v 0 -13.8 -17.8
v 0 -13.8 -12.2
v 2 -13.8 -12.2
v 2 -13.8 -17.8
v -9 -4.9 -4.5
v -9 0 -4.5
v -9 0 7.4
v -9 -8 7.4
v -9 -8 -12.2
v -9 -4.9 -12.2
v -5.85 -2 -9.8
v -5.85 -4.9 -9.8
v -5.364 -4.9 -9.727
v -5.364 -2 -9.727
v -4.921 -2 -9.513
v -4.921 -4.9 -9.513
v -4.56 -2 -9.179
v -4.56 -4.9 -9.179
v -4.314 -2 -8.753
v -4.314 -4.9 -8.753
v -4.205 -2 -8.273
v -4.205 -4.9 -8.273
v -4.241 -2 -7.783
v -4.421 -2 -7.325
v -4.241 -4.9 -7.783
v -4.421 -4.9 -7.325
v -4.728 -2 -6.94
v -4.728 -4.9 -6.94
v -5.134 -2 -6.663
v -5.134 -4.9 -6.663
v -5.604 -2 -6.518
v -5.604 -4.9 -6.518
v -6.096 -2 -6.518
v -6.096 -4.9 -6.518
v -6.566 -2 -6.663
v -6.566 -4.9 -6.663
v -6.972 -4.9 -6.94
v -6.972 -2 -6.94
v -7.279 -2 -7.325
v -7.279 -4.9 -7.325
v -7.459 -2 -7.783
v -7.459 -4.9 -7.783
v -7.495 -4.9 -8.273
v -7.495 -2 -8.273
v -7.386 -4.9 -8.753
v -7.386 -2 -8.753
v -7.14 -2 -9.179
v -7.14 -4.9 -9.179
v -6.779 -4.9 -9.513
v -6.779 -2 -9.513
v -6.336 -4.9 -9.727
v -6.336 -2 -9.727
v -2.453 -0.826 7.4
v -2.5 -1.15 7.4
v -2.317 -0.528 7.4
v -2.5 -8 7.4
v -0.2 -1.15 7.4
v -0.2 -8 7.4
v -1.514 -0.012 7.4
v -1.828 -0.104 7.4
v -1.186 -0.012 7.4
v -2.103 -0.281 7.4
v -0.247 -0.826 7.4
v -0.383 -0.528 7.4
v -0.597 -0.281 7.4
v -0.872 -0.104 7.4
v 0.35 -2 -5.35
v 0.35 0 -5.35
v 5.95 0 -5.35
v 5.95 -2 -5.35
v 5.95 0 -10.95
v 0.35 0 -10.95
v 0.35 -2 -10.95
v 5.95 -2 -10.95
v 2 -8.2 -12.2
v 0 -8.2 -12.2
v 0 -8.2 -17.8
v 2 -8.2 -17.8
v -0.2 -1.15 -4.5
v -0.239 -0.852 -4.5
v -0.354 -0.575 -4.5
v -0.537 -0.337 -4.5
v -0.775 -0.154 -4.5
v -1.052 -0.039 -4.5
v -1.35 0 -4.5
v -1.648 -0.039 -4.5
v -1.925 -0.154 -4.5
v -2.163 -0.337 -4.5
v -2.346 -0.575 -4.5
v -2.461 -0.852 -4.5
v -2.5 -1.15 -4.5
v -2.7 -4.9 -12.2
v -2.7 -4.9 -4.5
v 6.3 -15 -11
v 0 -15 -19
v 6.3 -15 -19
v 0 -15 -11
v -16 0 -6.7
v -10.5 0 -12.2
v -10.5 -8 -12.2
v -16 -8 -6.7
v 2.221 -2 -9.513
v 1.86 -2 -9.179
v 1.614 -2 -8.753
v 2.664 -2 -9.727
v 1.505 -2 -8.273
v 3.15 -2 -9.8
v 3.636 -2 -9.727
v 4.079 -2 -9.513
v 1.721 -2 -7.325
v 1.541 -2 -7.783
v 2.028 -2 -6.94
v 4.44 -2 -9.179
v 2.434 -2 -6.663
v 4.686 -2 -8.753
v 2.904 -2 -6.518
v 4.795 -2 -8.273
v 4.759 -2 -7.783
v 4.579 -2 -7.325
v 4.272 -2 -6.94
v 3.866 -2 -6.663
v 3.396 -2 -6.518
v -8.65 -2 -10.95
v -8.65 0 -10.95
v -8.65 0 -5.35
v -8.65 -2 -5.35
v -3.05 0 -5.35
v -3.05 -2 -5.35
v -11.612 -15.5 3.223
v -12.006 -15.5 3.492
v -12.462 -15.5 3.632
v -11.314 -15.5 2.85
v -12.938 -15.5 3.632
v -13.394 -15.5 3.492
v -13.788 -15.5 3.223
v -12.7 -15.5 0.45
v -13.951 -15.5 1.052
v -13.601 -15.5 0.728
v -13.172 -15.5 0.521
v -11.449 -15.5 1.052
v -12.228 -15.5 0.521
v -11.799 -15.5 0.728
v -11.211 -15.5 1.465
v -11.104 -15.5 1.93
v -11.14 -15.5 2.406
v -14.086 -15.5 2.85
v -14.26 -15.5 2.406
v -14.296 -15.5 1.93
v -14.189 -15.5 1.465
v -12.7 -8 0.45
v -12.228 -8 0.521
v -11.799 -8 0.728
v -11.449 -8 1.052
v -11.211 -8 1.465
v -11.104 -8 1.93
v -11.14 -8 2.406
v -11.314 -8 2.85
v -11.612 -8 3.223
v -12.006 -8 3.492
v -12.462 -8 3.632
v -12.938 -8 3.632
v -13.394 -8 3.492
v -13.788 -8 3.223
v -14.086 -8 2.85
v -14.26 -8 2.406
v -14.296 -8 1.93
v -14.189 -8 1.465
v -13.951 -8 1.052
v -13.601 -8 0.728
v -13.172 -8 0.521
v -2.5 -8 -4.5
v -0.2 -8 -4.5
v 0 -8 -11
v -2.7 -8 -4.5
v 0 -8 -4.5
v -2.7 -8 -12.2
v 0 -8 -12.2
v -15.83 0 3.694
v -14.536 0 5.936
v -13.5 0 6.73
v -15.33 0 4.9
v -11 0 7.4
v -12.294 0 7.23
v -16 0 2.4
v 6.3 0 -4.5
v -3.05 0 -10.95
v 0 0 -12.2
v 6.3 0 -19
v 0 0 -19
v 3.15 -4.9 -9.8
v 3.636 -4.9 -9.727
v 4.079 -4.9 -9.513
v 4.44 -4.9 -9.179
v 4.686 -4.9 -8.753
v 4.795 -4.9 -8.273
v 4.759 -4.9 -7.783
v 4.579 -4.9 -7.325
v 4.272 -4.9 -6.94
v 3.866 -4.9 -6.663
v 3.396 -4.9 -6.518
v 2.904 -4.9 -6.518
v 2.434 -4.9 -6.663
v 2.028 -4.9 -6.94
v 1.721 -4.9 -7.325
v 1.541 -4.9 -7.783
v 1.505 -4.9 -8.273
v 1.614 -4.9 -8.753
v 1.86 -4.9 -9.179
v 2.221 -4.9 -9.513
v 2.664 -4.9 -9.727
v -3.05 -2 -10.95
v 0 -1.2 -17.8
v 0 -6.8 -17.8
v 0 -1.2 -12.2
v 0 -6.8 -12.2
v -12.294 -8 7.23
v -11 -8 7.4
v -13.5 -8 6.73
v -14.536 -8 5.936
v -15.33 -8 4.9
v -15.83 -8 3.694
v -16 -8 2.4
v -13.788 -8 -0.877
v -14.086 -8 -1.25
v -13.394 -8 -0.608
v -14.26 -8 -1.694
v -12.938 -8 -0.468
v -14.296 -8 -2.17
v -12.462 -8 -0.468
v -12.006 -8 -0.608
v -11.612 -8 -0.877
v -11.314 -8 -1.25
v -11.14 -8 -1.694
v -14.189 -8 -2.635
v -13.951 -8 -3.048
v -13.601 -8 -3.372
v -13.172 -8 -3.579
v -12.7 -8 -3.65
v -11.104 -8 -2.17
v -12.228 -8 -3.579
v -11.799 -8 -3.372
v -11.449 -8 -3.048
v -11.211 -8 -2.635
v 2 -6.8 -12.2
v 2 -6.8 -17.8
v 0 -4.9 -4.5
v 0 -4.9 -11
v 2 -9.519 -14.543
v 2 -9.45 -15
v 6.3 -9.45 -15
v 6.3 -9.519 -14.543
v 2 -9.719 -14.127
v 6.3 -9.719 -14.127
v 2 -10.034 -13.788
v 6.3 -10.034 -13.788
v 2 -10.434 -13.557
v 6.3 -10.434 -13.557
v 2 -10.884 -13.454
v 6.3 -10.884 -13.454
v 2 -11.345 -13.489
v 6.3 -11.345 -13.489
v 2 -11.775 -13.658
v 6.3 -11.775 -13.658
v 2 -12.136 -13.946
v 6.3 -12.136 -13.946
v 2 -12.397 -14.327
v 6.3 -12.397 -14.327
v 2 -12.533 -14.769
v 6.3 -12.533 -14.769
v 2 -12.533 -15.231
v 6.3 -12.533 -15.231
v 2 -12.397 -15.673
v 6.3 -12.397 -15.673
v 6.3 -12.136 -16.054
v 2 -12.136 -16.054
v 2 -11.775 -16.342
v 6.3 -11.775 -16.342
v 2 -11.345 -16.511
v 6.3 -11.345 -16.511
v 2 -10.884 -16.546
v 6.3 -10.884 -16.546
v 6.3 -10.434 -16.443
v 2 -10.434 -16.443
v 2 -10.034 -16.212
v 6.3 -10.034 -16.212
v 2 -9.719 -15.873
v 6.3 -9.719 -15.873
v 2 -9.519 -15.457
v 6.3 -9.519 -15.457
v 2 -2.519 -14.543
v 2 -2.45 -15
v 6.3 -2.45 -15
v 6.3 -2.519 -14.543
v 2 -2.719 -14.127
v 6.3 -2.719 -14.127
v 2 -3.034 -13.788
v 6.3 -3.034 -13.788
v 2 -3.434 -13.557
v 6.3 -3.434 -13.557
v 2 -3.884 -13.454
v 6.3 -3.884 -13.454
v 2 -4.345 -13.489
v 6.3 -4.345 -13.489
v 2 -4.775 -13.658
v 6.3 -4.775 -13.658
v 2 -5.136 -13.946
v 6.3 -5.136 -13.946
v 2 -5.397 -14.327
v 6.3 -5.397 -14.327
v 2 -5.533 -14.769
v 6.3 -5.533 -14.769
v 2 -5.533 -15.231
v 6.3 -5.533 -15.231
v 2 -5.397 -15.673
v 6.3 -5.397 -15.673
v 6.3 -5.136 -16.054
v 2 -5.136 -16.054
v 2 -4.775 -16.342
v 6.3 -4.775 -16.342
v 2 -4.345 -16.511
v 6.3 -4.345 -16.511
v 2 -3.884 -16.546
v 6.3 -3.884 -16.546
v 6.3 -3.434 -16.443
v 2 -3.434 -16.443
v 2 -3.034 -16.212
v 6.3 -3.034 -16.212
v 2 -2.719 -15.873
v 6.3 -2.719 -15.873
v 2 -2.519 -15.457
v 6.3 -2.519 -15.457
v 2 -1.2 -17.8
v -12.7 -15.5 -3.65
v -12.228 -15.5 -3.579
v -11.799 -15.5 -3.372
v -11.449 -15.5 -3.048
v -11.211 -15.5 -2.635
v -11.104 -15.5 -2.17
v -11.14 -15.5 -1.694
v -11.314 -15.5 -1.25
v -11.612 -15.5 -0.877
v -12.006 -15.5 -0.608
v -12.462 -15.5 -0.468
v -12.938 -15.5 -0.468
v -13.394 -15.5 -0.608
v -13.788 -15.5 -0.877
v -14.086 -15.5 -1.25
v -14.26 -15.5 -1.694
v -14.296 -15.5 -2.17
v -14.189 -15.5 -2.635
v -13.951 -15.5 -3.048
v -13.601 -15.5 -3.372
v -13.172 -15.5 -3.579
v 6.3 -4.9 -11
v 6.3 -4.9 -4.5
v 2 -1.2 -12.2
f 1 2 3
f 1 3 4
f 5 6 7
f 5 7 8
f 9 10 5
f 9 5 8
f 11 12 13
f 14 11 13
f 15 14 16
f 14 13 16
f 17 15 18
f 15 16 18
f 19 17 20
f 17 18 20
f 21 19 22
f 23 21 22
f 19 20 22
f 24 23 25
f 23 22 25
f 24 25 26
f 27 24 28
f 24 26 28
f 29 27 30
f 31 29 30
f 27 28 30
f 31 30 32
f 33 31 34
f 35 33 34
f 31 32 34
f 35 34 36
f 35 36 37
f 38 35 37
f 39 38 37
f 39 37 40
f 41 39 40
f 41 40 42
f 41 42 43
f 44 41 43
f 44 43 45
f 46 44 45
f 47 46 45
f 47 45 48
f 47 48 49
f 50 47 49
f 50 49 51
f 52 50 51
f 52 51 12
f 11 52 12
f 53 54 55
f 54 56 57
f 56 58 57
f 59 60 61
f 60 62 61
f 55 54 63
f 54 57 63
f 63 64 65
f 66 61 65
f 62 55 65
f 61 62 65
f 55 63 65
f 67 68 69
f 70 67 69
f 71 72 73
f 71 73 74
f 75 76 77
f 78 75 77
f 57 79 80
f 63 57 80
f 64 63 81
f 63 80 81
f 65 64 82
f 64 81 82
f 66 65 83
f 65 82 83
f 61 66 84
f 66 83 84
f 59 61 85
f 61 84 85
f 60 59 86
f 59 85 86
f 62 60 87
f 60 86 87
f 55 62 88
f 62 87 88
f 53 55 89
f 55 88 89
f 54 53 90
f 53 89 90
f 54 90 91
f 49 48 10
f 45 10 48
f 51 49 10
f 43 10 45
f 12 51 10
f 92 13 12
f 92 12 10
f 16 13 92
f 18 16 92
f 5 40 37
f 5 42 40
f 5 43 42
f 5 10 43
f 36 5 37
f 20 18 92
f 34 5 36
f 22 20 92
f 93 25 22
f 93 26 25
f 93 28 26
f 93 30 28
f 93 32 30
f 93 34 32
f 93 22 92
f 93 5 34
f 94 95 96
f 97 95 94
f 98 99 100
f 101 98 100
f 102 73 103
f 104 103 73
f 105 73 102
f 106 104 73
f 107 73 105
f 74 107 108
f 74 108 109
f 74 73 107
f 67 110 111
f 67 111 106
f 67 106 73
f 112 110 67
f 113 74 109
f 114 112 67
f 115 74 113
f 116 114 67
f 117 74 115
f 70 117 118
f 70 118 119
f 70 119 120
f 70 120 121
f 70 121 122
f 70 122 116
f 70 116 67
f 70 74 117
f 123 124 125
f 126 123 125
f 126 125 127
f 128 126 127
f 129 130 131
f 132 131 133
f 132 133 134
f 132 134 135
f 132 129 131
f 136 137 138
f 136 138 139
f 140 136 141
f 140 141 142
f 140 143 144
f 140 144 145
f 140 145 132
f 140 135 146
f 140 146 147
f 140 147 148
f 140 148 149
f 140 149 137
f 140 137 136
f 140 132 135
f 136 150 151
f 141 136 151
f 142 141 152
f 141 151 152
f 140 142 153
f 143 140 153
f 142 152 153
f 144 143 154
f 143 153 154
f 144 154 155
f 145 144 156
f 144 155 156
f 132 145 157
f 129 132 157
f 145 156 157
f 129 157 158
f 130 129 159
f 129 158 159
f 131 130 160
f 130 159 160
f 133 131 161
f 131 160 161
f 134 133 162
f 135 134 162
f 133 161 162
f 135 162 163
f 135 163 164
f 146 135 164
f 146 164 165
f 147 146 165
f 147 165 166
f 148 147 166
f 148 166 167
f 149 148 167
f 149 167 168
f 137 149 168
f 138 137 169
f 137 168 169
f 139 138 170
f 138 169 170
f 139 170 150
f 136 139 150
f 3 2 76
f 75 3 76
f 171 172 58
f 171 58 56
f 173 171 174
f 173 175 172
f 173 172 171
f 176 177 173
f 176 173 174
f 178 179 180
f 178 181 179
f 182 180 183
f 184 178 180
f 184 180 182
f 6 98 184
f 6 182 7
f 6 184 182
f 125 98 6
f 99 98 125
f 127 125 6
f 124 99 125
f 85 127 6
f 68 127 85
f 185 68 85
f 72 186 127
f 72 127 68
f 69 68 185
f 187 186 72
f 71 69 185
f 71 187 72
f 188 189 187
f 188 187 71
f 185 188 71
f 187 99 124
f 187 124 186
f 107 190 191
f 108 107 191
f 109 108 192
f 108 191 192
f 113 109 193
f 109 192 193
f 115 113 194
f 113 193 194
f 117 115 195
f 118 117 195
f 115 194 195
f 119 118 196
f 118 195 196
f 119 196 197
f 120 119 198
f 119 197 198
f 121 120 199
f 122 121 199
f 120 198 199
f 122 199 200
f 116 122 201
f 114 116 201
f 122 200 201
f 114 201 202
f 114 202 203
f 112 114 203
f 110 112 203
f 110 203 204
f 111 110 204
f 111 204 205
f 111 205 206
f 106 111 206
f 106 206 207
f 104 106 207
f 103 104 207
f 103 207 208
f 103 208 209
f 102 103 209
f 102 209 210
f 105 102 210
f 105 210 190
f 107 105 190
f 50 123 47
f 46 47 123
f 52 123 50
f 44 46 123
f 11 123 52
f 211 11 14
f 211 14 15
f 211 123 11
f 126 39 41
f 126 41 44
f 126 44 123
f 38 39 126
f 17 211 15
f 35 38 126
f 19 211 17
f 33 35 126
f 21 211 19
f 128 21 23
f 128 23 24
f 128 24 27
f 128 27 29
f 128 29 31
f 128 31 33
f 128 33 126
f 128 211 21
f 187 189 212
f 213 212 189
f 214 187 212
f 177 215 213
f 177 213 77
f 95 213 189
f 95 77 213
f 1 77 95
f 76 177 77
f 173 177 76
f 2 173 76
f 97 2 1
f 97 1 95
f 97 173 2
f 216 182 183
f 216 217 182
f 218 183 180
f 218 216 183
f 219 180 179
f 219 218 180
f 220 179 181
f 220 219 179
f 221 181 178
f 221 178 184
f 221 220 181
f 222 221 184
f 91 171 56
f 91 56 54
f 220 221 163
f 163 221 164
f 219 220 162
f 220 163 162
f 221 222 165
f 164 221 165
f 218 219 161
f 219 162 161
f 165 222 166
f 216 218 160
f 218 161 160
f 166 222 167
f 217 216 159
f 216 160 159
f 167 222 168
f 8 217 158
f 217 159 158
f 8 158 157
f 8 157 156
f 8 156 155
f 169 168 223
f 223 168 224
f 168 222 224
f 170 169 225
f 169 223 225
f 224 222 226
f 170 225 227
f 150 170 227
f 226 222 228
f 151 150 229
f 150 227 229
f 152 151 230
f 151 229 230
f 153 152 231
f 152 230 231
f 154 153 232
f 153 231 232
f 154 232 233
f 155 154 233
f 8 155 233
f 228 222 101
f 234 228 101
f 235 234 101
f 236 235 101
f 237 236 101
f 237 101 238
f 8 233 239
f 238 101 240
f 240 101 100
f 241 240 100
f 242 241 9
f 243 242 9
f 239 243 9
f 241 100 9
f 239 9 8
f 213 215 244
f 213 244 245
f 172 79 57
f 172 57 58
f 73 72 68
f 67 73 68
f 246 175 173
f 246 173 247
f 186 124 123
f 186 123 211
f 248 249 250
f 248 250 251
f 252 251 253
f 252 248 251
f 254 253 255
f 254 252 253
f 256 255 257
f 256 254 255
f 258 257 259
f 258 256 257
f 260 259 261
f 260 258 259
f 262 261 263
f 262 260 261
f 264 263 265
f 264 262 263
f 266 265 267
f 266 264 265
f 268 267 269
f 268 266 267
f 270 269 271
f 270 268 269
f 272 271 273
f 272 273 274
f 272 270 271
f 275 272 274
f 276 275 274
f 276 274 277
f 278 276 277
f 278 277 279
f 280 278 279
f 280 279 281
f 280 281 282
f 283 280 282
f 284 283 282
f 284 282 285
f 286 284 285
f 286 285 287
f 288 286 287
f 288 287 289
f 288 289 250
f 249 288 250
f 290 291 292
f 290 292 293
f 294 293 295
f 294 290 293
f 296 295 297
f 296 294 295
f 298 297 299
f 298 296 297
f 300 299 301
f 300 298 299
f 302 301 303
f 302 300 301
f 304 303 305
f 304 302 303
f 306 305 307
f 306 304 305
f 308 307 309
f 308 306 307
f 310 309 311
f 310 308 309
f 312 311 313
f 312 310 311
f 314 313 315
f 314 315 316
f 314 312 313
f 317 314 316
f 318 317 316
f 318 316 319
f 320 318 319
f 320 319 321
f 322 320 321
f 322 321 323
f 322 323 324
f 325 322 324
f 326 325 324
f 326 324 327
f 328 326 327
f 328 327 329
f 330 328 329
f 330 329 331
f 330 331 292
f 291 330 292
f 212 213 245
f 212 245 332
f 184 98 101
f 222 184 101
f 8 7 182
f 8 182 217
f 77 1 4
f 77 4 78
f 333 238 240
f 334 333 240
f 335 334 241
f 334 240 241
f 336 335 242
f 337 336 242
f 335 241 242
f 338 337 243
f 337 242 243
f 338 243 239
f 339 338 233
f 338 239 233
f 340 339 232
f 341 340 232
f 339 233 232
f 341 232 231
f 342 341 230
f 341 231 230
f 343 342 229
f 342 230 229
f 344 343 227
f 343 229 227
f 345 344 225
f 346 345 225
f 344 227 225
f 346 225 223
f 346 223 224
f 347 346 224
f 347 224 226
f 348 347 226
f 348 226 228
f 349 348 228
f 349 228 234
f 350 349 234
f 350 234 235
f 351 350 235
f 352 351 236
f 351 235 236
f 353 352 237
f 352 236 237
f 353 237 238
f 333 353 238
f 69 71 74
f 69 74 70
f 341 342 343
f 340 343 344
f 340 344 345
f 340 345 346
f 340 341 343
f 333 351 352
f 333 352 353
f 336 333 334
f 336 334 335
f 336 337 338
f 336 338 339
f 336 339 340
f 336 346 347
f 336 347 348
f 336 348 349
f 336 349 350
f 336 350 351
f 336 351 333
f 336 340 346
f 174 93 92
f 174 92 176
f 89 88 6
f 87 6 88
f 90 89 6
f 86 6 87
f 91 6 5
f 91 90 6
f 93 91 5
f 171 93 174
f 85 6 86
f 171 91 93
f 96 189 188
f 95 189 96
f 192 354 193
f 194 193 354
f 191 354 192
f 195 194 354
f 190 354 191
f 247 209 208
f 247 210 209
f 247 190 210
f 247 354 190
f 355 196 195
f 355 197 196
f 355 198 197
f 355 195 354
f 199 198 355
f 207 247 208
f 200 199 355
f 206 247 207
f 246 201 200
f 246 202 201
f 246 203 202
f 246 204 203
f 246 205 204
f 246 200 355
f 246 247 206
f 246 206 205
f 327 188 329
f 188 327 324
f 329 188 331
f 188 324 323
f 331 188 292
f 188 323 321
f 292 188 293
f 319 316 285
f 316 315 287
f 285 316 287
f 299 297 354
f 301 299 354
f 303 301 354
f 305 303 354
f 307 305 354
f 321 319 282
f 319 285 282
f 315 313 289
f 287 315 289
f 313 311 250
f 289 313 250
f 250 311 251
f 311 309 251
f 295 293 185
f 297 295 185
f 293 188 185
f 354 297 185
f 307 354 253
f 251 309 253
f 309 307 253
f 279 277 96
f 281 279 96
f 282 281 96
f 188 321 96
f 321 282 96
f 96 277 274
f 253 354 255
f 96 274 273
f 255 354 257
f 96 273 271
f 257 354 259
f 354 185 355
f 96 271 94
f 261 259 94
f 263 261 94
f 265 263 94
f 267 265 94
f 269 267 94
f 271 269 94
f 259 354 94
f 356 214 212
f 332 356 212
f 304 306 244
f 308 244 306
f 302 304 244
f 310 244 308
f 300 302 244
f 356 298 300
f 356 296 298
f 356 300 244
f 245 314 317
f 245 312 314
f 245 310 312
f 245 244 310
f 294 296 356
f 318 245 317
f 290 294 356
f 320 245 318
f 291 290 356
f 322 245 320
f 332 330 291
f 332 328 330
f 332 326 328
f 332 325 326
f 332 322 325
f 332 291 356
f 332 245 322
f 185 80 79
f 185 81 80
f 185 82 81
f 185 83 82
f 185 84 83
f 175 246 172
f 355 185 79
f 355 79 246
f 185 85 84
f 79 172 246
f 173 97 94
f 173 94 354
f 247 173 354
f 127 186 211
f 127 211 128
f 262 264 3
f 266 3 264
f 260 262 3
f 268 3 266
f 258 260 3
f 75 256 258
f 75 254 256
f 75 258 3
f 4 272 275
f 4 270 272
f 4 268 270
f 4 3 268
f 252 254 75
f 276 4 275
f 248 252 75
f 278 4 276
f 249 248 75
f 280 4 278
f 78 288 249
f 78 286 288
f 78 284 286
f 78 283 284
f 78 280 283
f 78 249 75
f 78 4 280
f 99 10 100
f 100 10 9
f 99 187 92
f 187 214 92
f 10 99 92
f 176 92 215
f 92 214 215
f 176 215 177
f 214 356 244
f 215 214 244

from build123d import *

# Parameters (mm, degrees)
SKETCH_R        = 1.55
PAD_DEPTH       = 6.3
SKETCH002_W     = 5.6
SKETCH002_H     = 5.6
POCKET_DEPTH    = 2
PAD001_DEPTH    = 7.7
SKETCH003_R     = 1.65
POCKET001_DEPTH = 4.901
SKETCH004_W     = 5.6
SKETCH004_H     = 5.6
POCKET002_DEPTH = 2
SKETCH005_W     = 8
SKETCH005_H     = 7
PAD002_DEPTH    = 11.9
SKETCH006_R     = 1.6
PAD003_DEPTH    = 7.5
PAD004_DEPTH    = 11.9
FILLET_R        = 5
CHAMFER_SIZE    = 5.5


with BuildPart() as part:
    # Sketch → Pad (new body)
    with BuildSketch(Plane.YZ):
        Polygon((-4.9, -4.5), (0, -4.5), (0, -19), (-15, -19), (-15, -11), (-4.9, -11), align=None)
        with Locations((-11, -15)):
            Circle(SKETCH_R, mode=Mode.SUBTRACT)
        with Locations((-4, -15)):
            Circle(SKETCH_R, mode=Mode.SUBTRACT)
    extrude(amount=PAD_DEPTH)

    # Sketch002 (on Face9 of Pad) → Pocket (cut)
    with BuildSketch(Plane(origin=(0, 0, 0), x_dir=(0, 1, 0), z_dir=(-1, 0, 0))):
        with Locations((-11, 15)):
            Rectangle(SKETCH002_W, SKETCH002_H)
        with Locations((-4, 15)):
            Rectangle(SKETCH002_W, SKETCH002_H)
    extrude(amount=-POCKET_DEPTH, mode=Mode.SUBTRACT)

    # Sketch001 (on Face1 of Pad) → Pad001 (join)
    with BuildSketch(Plane(origin=(0, 0, -4.5), x_dir=(0, -1, 0), z_dir=(0, 0, 1))):
        Polygon((0, 0), (0, -16), (8, -16), (8, -9), (4.9, -9), (4.9, -2.7), (8, -2.7), (8, 0), align=None)
    extrude(amount=-PAD001_DEPTH)

    # Sketch003 (on Face1 of Pad001) → Pocket001 (cut, through all)
    with BuildSketch(Plane(origin=(0, -4.9, 0), x_dir=(0, 0, -1), z_dir=(0, -1, 0))):
        with Locations((8.15, -5.85)):
            Circle(SKETCH003_R)
        with Locations((8.15, 3.15)):
            Circle(SKETCH003_R)
    extrude(amount=-POCKET001_DEPTH, mode=Mode.SUBTRACT)

    # Sketch004 (on Face10 of Pocket001) → Pocket002 (cut)
    with BuildSketch(Plane.ZX):
        with Locations((-8.15, 3.15)):
            Rectangle(SKETCH004_W, SKETCH004_H)
        with Locations((-8.15, -5.85)):
            Rectangle(SKETCH004_W, SKETCH004_H)
    extrude(amount=-POCKET002_DEPTH, mode=Mode.SUBTRACT)

    # Sketch005 (on Face5 of Pocket002) → Pad002 (join)
    with BuildSketch(Plane(origin=(0, 0, -4.5), x_dir=(0, -1, 0), z_dir=(0, 0, 1))):
        with Locations((4, -12.5)):
            Rectangle(SKETCH005_W, SKETCH005_H)
    extrude(amount=PAD002_DEPTH)

    # Sketch006 (on Face36 of Pad002) → Pad003 (join)
    with BuildSketch(Plane(origin=(0, -8, 0), x_dir=(0, 0, -1), z_dir=(0, -1, 0))):
        with Locations((-2.05, -12.7)):
            Circle(SKETCH006_R)
        with Locations((2.05, -12.7)):
            Circle(SKETCH006_R)
    extrude(amount=PAD003_DEPTH)

    # Sketch007 → Pad004 (join)
    with BuildSketch(Plane(origin=(0, 0, -4.5), x_dir=(0, -1, 0), z_dir=(0, 0, 1))):
        with BuildLine():
            Line((8, -2.5), (1.15, -2.5))
            ThreePointArc((1.15, -0.2), (0, -1.35), (1.15, -2.5))
            Line((1.15, -0.2), (8, -0.2))
            Line((8, -0.2), (8, -2.5))
        make_face()
    extrude(amount=PAD004_DEPTH)

    # Fillet
    fillet_edges = [part.edges().sort_by_distance(p)[0] for p in [
        (-16, -4, 7.4),
    ]]
    fillet(fillet_edges, radius=FILLET_R)

    # Chamfer
    chamfer_edges = [part.edges().sort_by_distance(p)[0] for p in [
        (-16, -4, -12.2),
    ]]
    chamfer(chamfer_edges, length=CHAMFER_SIZE)


solid = part.part
